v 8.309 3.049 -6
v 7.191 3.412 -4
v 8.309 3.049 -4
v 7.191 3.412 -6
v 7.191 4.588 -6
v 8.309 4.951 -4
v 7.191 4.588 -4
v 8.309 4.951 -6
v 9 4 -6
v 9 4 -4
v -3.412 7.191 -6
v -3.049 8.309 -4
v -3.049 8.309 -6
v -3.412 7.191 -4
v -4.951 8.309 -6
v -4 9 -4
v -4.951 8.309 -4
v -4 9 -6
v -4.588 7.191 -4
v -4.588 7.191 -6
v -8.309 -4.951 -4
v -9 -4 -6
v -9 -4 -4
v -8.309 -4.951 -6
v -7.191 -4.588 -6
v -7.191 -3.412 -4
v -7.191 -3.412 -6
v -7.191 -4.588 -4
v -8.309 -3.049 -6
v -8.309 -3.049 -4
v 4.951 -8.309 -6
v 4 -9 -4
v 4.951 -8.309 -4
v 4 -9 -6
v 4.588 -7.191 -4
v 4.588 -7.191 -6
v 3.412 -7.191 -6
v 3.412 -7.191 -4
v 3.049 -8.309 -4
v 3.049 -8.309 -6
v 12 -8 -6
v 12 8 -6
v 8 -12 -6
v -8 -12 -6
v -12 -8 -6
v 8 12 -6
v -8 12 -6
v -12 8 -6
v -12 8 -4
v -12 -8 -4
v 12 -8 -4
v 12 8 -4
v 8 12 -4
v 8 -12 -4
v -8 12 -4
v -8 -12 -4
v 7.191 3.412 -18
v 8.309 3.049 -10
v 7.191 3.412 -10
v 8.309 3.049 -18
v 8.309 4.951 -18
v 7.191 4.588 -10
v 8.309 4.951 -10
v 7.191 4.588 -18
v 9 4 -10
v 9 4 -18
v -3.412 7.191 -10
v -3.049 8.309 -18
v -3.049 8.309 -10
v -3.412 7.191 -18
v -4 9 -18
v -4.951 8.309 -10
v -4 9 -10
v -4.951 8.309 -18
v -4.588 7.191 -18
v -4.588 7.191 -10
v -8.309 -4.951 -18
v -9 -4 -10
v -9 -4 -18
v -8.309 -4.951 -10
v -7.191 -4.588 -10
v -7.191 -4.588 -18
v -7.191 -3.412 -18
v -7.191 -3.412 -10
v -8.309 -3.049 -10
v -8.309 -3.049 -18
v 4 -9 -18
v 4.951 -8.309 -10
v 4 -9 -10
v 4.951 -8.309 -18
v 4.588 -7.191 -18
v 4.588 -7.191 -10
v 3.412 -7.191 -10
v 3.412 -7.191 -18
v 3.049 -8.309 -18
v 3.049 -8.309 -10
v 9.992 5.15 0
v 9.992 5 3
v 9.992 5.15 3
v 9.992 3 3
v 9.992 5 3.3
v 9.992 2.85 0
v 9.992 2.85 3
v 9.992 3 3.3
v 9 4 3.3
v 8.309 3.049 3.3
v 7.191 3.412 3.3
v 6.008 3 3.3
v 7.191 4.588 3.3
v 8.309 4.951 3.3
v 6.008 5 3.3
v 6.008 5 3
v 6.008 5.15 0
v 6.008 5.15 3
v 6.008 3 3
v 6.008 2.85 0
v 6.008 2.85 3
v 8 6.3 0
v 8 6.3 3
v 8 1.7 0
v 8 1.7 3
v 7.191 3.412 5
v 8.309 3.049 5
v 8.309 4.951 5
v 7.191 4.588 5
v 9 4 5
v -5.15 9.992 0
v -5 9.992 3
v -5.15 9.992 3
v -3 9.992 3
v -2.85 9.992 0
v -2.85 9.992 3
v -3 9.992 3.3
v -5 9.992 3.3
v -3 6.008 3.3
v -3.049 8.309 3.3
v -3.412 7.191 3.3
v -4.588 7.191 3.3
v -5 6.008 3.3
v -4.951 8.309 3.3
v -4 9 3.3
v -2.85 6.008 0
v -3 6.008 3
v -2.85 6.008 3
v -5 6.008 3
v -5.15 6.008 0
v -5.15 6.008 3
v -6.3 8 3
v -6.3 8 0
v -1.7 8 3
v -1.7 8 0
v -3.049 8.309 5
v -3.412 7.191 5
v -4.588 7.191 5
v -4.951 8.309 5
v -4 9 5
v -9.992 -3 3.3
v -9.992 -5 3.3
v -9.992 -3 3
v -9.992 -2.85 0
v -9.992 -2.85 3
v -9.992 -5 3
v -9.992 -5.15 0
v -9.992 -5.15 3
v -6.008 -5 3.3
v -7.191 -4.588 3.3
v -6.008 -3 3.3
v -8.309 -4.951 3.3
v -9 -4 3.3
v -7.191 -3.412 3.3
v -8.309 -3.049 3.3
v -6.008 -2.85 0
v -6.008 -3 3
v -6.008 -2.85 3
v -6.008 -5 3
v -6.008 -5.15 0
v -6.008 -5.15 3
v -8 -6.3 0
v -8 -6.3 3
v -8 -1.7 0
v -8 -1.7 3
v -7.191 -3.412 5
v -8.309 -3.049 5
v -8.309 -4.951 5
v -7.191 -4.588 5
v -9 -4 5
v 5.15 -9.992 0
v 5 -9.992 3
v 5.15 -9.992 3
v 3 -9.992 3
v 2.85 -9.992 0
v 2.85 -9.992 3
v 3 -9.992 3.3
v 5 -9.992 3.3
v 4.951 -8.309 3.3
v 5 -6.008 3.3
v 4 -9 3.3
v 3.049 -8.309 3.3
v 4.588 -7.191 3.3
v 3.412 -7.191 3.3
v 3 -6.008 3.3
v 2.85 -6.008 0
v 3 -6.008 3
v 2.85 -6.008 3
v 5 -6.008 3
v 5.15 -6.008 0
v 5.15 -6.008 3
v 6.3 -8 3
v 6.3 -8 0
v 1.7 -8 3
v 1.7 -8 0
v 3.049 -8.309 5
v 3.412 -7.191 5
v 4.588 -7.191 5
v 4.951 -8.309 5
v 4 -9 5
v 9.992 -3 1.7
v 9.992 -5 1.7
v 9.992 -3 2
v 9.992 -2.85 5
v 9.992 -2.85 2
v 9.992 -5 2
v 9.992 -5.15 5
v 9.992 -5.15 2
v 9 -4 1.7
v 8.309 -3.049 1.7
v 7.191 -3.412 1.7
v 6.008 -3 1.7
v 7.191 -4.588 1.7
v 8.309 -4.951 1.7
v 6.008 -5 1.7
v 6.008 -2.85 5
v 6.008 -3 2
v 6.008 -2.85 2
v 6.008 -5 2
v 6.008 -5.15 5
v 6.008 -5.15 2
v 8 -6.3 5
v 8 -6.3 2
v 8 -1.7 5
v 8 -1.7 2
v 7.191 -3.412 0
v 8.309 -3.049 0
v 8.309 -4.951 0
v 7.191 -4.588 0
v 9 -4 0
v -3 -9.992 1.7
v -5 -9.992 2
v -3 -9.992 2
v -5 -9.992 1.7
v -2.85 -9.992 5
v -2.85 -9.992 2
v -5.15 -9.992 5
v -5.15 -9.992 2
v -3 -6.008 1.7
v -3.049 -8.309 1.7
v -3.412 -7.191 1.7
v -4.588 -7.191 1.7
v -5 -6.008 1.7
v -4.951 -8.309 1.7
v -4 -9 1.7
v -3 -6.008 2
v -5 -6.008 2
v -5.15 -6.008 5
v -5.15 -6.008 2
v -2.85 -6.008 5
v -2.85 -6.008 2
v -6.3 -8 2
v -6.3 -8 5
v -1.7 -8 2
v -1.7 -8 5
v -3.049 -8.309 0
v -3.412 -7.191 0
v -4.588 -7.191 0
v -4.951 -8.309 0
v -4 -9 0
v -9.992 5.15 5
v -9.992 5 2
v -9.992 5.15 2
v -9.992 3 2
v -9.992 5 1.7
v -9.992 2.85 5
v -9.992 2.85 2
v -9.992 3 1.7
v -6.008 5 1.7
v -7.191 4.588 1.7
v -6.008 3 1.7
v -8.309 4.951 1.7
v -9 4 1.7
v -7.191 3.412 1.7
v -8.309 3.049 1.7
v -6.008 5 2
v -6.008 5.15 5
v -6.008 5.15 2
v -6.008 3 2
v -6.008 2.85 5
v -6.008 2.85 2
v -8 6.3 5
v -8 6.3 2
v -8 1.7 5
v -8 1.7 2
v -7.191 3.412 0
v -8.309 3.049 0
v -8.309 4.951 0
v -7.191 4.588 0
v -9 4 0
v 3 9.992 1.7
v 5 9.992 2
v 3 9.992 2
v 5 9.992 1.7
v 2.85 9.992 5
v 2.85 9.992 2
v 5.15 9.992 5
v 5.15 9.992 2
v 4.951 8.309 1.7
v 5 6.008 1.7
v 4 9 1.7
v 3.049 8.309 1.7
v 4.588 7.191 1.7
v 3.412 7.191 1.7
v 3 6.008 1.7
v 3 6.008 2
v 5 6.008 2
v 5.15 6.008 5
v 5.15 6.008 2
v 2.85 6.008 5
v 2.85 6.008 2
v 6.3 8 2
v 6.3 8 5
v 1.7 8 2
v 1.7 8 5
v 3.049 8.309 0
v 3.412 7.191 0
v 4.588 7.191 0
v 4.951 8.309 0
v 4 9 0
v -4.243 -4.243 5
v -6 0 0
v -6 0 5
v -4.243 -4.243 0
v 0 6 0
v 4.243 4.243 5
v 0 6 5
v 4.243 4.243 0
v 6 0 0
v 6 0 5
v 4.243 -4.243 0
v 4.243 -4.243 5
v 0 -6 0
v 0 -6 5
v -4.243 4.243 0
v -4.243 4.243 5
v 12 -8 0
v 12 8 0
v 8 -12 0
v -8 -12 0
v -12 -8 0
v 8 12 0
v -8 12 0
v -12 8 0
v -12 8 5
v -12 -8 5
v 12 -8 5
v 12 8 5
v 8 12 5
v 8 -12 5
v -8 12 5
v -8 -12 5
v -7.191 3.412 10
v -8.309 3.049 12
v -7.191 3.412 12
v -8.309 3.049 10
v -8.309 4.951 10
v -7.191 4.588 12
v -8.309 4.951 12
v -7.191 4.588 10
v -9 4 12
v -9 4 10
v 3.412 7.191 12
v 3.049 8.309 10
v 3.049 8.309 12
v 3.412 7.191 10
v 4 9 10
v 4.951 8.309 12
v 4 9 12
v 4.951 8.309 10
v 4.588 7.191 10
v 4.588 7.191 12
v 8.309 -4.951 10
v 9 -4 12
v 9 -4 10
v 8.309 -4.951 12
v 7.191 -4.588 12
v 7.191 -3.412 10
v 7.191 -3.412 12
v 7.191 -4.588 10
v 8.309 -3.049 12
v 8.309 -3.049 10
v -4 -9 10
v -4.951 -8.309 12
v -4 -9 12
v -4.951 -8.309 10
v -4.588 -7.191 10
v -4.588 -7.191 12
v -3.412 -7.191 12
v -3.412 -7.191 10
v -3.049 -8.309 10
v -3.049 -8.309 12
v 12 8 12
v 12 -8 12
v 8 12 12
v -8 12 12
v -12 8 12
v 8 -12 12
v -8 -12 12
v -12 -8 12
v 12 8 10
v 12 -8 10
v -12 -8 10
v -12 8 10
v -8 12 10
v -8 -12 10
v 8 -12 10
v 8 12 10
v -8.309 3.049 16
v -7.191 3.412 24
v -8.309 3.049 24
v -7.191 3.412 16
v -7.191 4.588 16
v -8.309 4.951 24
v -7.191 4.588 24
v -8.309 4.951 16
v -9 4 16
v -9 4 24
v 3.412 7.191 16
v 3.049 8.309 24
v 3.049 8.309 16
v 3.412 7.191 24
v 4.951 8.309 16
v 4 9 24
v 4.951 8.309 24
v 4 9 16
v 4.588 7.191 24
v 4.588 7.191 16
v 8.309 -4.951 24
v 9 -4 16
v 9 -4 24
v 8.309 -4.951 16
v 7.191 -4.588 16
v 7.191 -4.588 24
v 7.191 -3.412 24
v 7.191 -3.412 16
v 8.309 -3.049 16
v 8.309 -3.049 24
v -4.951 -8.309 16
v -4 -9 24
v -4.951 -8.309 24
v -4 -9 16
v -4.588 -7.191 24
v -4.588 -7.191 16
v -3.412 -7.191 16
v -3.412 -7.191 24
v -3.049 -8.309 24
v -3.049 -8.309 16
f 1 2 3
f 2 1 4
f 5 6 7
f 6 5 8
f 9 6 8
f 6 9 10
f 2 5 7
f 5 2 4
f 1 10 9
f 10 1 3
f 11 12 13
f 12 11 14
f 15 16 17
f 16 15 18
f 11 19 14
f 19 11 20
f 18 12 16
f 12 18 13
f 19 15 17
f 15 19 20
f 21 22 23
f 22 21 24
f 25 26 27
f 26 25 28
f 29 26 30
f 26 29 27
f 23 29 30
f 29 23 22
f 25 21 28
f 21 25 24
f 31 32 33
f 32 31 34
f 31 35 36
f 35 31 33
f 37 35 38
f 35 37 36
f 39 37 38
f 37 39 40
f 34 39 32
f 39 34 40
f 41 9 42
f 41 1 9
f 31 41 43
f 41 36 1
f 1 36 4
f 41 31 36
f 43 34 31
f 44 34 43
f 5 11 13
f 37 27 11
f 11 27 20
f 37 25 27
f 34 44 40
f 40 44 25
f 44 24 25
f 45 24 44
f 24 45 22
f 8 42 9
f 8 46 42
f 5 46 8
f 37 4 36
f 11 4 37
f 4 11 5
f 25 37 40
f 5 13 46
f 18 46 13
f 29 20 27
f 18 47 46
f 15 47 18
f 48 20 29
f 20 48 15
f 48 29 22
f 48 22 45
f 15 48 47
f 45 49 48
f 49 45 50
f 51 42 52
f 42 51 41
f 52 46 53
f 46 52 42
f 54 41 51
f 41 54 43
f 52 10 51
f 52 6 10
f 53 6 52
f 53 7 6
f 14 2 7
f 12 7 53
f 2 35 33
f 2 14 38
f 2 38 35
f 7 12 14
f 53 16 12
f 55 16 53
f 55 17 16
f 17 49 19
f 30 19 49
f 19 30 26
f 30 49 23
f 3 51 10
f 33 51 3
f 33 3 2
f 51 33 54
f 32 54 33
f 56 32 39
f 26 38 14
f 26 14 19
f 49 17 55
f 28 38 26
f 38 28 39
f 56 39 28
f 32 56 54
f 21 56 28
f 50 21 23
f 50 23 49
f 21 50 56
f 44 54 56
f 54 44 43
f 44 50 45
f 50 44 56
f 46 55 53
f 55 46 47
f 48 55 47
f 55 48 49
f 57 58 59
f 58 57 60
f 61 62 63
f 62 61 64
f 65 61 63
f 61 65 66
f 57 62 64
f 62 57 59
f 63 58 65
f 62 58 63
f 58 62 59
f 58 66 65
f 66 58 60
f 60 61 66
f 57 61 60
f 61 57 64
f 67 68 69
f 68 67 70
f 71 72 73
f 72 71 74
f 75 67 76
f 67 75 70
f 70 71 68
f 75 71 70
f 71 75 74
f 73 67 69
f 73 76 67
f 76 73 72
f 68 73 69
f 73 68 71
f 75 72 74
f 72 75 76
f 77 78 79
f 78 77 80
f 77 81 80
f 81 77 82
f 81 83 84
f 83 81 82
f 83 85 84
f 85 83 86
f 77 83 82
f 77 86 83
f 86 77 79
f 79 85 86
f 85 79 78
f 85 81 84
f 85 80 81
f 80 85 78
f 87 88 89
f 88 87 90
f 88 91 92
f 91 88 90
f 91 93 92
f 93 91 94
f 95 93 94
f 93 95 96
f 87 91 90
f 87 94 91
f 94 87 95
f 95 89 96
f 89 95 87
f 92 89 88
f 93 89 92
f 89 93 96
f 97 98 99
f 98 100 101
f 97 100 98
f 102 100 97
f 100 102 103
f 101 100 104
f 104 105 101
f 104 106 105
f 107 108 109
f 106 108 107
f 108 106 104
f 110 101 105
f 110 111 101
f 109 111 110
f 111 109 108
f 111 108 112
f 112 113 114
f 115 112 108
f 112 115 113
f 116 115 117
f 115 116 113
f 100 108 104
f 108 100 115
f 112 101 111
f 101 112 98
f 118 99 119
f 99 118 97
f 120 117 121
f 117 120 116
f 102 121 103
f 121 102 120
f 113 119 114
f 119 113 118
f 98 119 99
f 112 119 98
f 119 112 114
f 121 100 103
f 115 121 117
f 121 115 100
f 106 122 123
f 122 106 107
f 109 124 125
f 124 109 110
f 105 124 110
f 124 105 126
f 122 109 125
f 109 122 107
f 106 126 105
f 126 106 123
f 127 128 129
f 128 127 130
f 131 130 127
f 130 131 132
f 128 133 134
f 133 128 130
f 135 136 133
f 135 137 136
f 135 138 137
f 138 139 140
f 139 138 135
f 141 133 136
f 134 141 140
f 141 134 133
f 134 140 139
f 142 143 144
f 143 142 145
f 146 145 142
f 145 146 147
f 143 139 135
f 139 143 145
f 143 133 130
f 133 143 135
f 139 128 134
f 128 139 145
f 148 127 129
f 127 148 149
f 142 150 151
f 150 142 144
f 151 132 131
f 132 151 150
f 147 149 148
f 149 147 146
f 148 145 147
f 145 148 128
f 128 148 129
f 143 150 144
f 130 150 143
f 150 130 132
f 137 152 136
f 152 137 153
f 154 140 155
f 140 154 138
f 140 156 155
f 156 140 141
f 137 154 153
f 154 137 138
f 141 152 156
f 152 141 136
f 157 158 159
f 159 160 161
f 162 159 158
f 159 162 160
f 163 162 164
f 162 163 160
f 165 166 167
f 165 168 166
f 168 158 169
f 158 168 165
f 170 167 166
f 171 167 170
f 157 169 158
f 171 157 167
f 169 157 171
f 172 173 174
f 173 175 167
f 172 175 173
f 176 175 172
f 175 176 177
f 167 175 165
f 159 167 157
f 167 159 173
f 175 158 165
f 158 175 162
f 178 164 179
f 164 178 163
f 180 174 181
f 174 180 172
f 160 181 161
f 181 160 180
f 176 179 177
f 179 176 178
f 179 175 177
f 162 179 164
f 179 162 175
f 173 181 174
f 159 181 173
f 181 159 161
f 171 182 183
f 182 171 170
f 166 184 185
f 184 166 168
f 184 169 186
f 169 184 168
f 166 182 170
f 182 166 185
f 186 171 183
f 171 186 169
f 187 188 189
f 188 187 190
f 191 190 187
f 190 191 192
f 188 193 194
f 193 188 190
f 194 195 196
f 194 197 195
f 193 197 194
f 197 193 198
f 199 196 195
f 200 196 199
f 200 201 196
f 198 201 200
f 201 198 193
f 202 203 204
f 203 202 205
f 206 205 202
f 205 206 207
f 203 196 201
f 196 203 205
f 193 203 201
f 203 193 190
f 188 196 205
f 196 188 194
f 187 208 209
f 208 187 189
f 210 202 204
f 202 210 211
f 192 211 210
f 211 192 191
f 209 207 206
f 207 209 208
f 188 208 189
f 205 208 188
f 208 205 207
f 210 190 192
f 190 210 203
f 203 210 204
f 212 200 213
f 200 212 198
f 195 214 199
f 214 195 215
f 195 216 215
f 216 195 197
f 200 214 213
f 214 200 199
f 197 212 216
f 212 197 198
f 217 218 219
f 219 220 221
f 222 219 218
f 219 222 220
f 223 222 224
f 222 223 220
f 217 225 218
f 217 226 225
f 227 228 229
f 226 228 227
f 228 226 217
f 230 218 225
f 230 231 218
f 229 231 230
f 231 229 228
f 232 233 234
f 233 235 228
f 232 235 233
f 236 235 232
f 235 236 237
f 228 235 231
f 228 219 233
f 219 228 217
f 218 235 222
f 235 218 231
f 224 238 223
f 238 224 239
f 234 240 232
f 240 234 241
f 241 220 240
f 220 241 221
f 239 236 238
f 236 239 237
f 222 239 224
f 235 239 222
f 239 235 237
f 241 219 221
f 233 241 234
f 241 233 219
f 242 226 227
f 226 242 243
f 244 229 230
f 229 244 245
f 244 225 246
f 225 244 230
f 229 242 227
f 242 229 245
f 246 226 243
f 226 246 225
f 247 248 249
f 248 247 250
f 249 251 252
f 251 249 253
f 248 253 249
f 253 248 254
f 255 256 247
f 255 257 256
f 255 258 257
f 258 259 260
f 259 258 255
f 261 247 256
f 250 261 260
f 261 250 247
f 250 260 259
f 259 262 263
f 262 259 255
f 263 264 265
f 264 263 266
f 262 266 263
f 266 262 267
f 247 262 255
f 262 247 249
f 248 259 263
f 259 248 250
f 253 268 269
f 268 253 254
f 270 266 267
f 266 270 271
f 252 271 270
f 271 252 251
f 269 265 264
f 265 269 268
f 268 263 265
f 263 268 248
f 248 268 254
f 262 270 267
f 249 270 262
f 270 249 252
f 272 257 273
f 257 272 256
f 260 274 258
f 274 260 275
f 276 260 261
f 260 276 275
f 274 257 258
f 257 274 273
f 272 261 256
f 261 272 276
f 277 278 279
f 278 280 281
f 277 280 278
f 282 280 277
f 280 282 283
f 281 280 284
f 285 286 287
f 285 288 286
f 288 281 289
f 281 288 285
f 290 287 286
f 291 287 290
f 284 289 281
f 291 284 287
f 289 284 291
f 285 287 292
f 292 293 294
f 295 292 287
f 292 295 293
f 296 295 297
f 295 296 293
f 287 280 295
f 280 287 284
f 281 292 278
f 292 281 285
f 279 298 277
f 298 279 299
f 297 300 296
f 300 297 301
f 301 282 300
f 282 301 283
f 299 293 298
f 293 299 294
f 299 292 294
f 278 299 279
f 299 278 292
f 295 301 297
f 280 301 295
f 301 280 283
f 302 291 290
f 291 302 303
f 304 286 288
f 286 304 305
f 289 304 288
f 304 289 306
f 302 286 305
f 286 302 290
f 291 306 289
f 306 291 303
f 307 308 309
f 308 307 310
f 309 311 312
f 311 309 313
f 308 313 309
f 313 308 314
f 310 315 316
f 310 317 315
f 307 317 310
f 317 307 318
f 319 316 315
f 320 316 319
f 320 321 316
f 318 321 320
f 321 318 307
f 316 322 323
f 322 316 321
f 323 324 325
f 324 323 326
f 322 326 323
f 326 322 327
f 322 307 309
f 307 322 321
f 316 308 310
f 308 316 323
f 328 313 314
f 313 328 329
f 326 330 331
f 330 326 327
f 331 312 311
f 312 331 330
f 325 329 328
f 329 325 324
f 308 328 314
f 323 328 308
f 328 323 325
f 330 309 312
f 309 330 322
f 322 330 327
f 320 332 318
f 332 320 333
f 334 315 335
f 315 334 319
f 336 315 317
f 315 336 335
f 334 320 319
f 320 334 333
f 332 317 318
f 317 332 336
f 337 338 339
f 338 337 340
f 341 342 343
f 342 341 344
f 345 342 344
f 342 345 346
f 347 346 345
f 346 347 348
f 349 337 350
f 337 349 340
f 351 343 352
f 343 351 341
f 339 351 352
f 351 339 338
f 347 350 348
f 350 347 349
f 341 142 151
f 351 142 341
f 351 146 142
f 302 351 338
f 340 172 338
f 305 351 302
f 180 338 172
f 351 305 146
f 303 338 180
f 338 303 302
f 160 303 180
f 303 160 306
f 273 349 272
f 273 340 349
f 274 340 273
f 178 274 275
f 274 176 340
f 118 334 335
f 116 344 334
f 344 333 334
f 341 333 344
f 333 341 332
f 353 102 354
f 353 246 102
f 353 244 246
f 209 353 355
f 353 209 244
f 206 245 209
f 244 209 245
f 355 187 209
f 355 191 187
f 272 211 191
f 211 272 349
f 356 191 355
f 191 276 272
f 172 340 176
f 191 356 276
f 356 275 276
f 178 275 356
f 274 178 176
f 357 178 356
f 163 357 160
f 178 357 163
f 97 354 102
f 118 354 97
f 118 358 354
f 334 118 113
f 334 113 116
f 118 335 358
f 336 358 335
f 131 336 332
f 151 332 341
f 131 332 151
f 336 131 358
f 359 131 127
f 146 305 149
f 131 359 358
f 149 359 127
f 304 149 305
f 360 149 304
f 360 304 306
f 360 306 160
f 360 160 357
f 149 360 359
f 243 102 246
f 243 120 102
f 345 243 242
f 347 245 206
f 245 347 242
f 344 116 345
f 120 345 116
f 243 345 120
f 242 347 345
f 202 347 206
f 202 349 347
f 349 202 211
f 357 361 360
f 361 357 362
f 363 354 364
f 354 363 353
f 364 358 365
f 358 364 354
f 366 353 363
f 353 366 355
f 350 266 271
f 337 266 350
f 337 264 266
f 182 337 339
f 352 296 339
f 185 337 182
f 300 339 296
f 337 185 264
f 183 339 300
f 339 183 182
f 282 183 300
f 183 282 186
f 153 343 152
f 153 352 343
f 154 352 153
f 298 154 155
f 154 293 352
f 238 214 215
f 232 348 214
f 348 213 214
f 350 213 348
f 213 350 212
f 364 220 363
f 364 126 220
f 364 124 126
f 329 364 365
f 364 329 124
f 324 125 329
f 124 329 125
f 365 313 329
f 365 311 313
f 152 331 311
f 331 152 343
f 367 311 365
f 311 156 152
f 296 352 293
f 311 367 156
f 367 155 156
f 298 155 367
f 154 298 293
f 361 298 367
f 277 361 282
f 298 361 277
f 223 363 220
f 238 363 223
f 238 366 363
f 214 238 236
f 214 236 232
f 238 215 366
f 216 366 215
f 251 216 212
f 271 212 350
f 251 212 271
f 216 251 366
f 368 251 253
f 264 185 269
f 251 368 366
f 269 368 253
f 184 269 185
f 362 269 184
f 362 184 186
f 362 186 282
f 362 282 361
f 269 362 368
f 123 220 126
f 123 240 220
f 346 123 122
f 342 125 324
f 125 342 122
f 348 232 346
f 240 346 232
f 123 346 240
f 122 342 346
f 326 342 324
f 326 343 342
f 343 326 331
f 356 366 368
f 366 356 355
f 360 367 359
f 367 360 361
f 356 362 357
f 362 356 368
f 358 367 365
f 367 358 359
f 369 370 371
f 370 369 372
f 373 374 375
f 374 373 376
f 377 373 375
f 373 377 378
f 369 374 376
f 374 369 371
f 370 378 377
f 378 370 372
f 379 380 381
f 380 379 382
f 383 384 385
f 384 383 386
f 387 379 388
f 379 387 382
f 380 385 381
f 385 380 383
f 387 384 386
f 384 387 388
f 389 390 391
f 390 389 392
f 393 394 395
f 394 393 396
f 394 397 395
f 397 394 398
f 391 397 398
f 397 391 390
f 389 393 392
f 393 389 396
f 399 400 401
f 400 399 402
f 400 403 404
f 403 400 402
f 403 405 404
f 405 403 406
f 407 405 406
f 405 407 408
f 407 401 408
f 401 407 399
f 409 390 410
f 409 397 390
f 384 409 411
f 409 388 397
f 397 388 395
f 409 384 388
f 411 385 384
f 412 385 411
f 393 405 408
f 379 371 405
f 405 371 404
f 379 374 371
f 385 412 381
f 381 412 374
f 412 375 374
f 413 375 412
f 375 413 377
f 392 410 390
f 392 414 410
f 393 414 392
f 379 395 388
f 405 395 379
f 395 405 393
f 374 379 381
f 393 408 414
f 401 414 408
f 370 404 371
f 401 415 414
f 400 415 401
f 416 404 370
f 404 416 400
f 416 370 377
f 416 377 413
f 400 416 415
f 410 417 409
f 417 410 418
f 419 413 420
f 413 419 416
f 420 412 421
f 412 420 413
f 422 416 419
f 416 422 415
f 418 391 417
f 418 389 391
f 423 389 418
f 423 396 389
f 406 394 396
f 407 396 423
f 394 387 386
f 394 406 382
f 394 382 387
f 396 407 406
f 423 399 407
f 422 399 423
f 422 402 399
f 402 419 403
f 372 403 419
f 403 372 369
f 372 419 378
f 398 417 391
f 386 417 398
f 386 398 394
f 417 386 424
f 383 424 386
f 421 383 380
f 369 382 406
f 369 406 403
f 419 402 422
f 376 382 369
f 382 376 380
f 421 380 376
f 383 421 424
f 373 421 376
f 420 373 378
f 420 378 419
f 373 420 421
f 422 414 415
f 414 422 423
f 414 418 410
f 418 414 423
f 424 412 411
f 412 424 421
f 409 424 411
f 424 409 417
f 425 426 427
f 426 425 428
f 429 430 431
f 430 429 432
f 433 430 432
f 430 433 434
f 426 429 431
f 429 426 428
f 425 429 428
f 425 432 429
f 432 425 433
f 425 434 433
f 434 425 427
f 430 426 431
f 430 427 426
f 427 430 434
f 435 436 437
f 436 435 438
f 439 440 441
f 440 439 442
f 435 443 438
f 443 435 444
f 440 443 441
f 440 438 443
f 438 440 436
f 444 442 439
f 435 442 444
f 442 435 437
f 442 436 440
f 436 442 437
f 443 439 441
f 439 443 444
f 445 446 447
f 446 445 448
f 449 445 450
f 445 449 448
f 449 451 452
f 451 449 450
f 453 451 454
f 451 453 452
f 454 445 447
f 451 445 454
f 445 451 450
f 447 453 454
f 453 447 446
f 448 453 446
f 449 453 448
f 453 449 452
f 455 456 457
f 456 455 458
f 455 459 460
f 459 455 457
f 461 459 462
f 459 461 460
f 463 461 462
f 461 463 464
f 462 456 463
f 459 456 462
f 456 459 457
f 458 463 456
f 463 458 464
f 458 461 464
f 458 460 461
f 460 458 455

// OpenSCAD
// file: ../tile.scad
//      0   1             2         3  4      5      6
//    [ a,  screw_coord,  corner_r, t, nut_d, nut_h, screw_d]
T36 = [ 36, [ 13, 8, 0 ], 6.000000, 3, 6.000, 2.500, 3 ];
T24 = [ 24, [ 08, 4, 0 ], 4.000000, 2, 4.600, 1.800, 2 ];

function Ta(class) = class[0];
function Tscrew_coord(class) = class[1];
function Tcorner(class) = class[2];
function Tt(class) = class[3];
function Tnut_d(class) = class[4];
function Tnut_h(class) = class[5];
function Tscrew_d(class) = class[6];

module tile(class, h, center = false, centered_hole = false) difference() {
    tile_pos(class = class, h = h, center = center);
    tile_neg(class = class, h = h, center = center,
             centered_hole = centered_hole);
}

module tile_neg(class, h, center = false, centered_hole = false) {
    translate([ 0, 0, center ? 0 : h / 2 ]) for (alpha = [ 0, 180 ])
        rotate([ alpha, 0, 0 ]) tile_screw_pos(class = class) tile_screw_hole(
            class = class, h = h, centered_hole = centered_hole);
    tile_center_hole(class, h + 2, center = center);
}

module tile_pos(class, h, center = false)
    linear_extrude(height = h, center = center, convexity = 10)
        tile_relief(class = class, a = Ta(class), corner_r = Tcorner(class),
                    t = Tt(class), nut_d = Tnut_d(class));

module tile_H(class, h) color("purple") render() difference() {
    top_offset = Ta(class) + h;
    z_center = Ta(class) / 2 + h;
    center_t = Tt(class) + 2 * Tnut_h(class);

    union() {
        translate([ 0, 0, z_center ])
            cube([ Ta(class), center_t, Ta(class) + 2 * h ], center = true);
        for (z = [ 0, top_offset ])
            translate([ 0, 0, z ]) linear_extrude(height = h)
                tile_base_shape(l = Ta(class), corner_r = Tcorner(class));
    }

    translate([ 0, 0, z_center ]) rotate([ 90, 0, 0 ]) {
        tile_neg(class, h = center_t, center = true, centered_hole = true);
        tile_center_hole(class, h = center_t, center = true);
    }

    for (z = [ 0, top_offset ])
        translate([ 0, 0, z ]) tile_center_hole(class, h = h);

    tile_screw_pos(class = class) translate([ 0, 0, h / 2 ])
        tile_screw_hole(class = class, h = h);

    mirror([ 1, 0, 0 ]) tile_screw_pos(class = class)
        translate([ 0, 0, Ta(class) + h + Tt(class) ]) rotate([ 180, 0, 0 ])
            tile_screw_hole(class = class, h = h);
}

module tile_raw_plate(class, x, y, t) {

    for (i = [0:x - 1], j = [0:y - 1])
        translate([ i * Ta(class), j * Ta(class), 0 ]) difference() {
            tile_pos(class, h = t, center = false);
            tile_screw_pos(class = class)
                cylinder(d = Tscrew_d(class), h = 100, center = true);
        }
}

//          Implementation
// ------------------------------------

module tile_center_hole(class, h, center = false) {
    cylinder(d = Ta(class) / 2, h = h, center = center, $fn = 8);
}

module tile_base_shape(l, corner_r) {
    hull() {
        square([ l - corner_r * 2, l ], center = true);
        square([ l, l - corner_r * 2 ], center = true);
    }
}

module tile_relief(class, a, corner_r, t, nut_d) {
    tile_base_shape(a, corner_r);
}

module tile_screw_pos(class) {
    for (alpha = [0:90:360])
        rotate([ 0, 0, alpha ]) translate(Tscrew_coord(class)) children();
}

module tile_plate(class, t) difference() {
    linear_extrude(height = t) tile_base_shape(Ta(class), Tcorner(class));

    mirror([ 1, 0, 0 ]) tile_screw_pos(class)
        cylinder(d = Tscrew_d(class), h = t * 3, center = true);
}

module tile_screw_hole(class, h, centered_hole = false) {
    layer_t = 0.3;
    nut_e = sqrt(pow(Tnut_d(class), 2) - pow(Tnut_d(class) / 2, 2));

    cylinder(d = Tscrew_d(class), h = h + 2, center = true);
    if (centered_hole) {
        for (alpha = [ 0, 180 ])
            rotate([ alpha, 0, 0 ]) translate([ 0, 0, Tt(class) / 2 ]) {
                cube([ nut_e, Tscrew_d(class), layer_t * 2 ], center = true);
                rotate([ 0, 0, 30 ])
                    cylinder(d = Tnut_d(class), h = h, $fn = 6);
            }
    } else {
        translate([ 0, 0, Tt(class) - h / 2 ]) {
            cube([ nut_e, Tscrew_d(class), layer_t * 2 ], center = true);
            rotate([ 0, 0, 30 ]) cylinder(
                d = Tnut_d(class), h = h - Tt(class) + Tnut_h(class), $fn = 6);
        }
    }
}

module tile_tube_hole(d) {
    rotate([ 90, 0, 0 ]) cylinder(d = d, h = 100, center = true);
}
// main file
include<../tile.scad>

translate([ 0, 0, -6 ]) {
    color("blue") tile_raw_plate(T24, 1, 1, 2);
    translate([ 0, 0, -12 ]) color("red") tile_screw_pos(T24)
        cylinder(d = Tscrew_d(T24), h = 8);
}

color("yellow") tile(T24, h = 5);

translate([ 0, 0, 12 ]) rotate([ 0, 180, 0 ]) {
    color("blue") tile_raw_plate(T24, 1, 1, 2);
    translate([ 0, 0, -12 ]) color("red") tile_screw_pos(T24)
        cylinder(d = Tscrew_d(T24), h = 8);
}
